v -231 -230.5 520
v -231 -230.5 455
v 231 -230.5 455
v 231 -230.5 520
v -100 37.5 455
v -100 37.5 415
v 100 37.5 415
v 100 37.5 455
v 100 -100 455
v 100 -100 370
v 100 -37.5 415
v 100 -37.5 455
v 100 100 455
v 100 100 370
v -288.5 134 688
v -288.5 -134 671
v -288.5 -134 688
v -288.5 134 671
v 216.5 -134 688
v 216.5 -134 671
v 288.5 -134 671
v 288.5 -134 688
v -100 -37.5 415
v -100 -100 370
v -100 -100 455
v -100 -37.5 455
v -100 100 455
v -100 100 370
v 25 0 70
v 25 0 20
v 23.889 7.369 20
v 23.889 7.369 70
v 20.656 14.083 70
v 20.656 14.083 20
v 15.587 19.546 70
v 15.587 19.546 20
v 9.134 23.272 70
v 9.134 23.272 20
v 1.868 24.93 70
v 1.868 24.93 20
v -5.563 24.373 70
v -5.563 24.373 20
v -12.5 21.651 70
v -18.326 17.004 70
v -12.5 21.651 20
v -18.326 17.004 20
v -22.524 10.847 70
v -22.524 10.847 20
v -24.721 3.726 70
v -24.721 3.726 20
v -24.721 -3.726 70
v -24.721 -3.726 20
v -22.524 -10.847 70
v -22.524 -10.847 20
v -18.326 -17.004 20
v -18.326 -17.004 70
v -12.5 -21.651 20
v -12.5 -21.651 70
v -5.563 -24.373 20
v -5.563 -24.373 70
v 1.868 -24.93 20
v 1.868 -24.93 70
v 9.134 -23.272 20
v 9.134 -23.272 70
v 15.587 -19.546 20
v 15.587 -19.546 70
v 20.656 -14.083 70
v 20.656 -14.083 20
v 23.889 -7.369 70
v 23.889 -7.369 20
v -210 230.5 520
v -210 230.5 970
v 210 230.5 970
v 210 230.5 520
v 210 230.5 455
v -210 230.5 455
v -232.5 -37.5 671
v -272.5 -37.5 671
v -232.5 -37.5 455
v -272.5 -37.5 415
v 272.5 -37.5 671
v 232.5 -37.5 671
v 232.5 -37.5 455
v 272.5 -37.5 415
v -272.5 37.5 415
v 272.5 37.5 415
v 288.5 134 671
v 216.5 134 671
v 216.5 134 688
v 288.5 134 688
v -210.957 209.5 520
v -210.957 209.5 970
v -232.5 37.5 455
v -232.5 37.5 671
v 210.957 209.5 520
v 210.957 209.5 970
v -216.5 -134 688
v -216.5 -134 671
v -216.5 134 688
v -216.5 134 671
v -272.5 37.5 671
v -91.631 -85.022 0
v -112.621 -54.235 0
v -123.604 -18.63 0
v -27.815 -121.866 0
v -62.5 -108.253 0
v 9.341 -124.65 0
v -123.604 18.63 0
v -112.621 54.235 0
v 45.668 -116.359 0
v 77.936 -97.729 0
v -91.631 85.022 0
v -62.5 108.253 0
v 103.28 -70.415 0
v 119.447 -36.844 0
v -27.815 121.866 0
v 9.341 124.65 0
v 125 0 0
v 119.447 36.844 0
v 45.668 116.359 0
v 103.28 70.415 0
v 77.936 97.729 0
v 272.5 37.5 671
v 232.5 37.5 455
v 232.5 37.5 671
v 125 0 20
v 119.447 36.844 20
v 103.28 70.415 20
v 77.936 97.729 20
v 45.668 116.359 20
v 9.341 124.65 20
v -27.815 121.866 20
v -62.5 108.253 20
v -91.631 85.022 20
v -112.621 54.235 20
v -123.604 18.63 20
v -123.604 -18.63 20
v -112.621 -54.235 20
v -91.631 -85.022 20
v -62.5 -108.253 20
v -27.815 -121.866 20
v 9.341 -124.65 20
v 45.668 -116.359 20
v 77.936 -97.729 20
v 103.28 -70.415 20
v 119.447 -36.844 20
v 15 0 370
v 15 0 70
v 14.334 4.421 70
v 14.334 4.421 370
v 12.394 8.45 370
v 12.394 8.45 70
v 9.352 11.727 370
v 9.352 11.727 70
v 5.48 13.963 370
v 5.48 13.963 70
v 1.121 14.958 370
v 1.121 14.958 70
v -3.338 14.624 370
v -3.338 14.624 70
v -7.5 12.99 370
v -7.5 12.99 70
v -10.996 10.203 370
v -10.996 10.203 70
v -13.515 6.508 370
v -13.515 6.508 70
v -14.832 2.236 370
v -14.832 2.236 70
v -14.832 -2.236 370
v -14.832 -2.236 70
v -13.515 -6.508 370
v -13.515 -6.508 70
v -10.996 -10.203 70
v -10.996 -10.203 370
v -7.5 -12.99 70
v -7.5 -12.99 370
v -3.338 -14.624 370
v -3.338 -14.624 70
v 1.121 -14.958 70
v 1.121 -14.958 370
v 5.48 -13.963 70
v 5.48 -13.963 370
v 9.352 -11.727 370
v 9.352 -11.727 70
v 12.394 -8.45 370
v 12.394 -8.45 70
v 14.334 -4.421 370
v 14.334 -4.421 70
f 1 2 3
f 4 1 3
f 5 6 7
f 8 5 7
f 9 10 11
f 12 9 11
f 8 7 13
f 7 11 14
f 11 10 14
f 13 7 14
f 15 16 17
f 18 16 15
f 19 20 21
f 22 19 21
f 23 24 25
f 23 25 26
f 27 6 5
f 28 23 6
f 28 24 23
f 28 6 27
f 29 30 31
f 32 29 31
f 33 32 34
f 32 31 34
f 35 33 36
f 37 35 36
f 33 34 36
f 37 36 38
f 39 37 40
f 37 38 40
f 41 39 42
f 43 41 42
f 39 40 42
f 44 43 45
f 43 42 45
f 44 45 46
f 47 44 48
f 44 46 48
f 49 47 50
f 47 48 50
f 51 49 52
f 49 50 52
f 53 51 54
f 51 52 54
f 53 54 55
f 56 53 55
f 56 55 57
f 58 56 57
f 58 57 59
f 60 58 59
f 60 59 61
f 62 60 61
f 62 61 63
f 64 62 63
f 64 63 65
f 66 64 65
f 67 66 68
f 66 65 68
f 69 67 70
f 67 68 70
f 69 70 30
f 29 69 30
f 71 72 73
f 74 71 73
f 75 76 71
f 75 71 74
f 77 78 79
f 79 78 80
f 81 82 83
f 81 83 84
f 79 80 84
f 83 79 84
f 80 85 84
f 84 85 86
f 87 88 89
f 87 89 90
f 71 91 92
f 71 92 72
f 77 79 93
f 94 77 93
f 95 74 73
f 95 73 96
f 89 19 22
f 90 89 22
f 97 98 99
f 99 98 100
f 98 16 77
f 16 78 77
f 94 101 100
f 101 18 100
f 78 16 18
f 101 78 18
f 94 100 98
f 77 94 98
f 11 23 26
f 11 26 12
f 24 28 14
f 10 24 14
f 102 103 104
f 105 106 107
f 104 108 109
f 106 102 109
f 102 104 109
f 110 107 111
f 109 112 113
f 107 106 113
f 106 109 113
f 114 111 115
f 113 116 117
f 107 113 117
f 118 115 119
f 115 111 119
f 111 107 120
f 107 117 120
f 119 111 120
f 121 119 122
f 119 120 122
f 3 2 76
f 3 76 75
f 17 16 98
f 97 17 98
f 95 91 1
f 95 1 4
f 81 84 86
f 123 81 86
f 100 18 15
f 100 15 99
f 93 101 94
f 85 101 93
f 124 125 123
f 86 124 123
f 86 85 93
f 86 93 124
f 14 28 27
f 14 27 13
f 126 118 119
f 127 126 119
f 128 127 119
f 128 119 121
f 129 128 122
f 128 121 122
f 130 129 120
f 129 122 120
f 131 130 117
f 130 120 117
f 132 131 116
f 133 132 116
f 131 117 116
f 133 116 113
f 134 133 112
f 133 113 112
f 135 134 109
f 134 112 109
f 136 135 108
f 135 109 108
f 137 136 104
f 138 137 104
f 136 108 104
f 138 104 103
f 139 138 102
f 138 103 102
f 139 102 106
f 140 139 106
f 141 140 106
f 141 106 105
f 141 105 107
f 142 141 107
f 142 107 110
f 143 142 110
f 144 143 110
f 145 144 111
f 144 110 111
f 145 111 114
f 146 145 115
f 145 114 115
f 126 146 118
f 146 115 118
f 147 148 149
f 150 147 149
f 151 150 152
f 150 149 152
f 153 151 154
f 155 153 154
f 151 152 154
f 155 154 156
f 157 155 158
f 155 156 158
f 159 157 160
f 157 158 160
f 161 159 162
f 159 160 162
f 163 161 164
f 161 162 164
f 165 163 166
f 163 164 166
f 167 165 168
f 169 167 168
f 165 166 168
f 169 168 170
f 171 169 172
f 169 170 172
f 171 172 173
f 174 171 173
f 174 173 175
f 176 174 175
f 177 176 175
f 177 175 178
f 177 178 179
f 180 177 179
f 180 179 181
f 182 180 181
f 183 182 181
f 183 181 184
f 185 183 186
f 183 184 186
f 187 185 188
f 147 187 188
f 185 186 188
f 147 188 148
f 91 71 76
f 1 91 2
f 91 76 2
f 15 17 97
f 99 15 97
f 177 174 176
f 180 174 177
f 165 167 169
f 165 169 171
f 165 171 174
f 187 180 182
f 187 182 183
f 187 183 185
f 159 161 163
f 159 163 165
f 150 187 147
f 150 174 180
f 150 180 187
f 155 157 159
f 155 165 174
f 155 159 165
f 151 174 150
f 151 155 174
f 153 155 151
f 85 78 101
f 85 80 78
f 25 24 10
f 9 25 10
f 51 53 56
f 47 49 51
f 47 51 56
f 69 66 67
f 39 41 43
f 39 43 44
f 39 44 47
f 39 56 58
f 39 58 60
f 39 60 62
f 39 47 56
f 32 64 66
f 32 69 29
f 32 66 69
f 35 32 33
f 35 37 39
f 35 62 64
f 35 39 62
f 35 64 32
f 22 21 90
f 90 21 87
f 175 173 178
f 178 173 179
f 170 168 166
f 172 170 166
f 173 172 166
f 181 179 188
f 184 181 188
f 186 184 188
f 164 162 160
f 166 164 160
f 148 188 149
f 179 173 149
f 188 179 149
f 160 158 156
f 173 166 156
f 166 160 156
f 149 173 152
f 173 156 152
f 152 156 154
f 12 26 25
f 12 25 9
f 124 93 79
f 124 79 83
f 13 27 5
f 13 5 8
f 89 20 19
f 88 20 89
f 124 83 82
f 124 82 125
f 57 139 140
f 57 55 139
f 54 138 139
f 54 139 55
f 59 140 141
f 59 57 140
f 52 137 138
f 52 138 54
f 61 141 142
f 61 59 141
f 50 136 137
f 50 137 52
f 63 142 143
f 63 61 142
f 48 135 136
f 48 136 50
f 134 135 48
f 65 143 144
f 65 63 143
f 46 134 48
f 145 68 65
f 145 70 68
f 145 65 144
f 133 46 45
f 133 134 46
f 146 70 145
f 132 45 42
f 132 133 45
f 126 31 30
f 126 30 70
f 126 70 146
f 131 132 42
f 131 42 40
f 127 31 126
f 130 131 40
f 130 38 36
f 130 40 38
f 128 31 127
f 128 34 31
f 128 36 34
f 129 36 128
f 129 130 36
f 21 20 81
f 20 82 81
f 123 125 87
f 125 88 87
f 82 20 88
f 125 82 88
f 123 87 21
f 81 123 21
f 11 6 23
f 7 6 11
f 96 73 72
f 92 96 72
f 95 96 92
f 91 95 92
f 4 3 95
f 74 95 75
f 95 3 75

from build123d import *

# Parameters (mm, degrees)
SKETCH_R     = 125
PAD_DEPTH    = 20
SKETCH001_R  = 25
PAD001_DEPTH = 50
SKETCH002_R  = 15
PAD002_DEPTH = 300
SKETCH003_W  = 200
SKETCH003_H  = 200
PAD003_DEPTH = 45
SKETCH009_W  = 200
SKETCH009_H  = 62.5
PAD009_DEPTH = 40
SKETCH004_W  = 545
SKETCH004_H  = 75
PAD004_DEPTH = 40
SKETCH005_W  = 40
SKETCH005_H  = 75
PAD005_DEPTH = 216
SKETCH006_W  = 72
SKETCH006_H  = 268
PAD006_DEPTH = 17
PAD007_DEPTH = 65
PAD008_DEPTH = 450


with BuildPart() as body1:
    # Sketch → Pad (new body)
    with BuildSketch(Plane.XY):
        Circle(SKETCH_R)
    extrude(amount=PAD_DEPTH)

    # Sketch001 (on Face3 of Pad) → Pad001 (join)
    with BuildSketch(Plane.XY.offset(20)):
        Circle(SKETCH001_R)
    extrude(amount=PAD001_DEPTH)


with BuildPart() as body2:
    # Sketch002 (on CopyPad) → Pad002 (new body)
    with BuildSketch(Plane.XY.offset(70)):
        Circle(SKETCH002_R)
    extrude(amount=PAD002_DEPTH)


with BuildPart() as body3:
    # Sketch003 (on Face1 of CopyPad002) → Pad003 (new body)
    with BuildSketch(Plane.XY.offset(370)):
        Rectangle(SKETCH003_W, SKETCH003_H)
    extrude(amount=PAD003_DEPTH)

    # Sketch009 (on Face6 of Pad003) → Pad009 (join)
    with BuildSketch(Plane.XY.offset(415)):
        with Locations((0, 68.75)):
            Rectangle(SKETCH009_W, SKETCH009_H)
        with Locations((0, -68.75)):
            Rectangle(SKETCH009_W, SKETCH009_H)
    extrude(amount=PAD009_DEPTH)


with BuildPart() as body4:
    # Sketch004 (on Face1 of CopyPad003) → Pad004 (new body)
    with BuildSketch(Plane.XY.offset(415)):
        Rectangle(SKETCH004_W, SKETCH004_H)
    extrude(amount=PAD004_DEPTH)

    # Sketch005 (on Face6 of Pad004) → Pad005 (join)
    with BuildSketch(Plane.XY.offset(455)):
        with Locations((-252.5, 0)):
            Rectangle(SKETCH005_W, SKETCH005_H)
        with Locations((252.5, 0)):
            Rectangle(SKETCH005_W, SKETCH005_H)
    extrude(amount=PAD005_DEPTH)

    # Sketch006 (on Face5 of Pad005) → Pad006 (join)
    with BuildSketch(Plane.XY.offset(671)):
        with Locations((-252.5, 0)):
            Rectangle(SKETCH006_W, SKETCH006_H)
        with Locations((252.5, 0)):
            Rectangle(SKETCH006_W, SKETCH006_H)
    extrude(amount=PAD006_DEPTH)


with BuildPart() as body5:
    # Sketch007 (on Face1 of CopyPad006) → Pad007 (new body)
    with BuildSketch(Plane.XY.offset(455)):
        Polygon((-210, 230.5), (-231, -230.5), (231, -230.5), (210, 230.5), align=None)
    extrude(amount=PAD007_DEPTH)

    # Sketch008 (on Face6 of Pad007) → Pad008 (join)
    with BuildSketch(Plane.XY.offset(520)):
        Polygon((-210, 230.5), (210, 230.5), (210.956616, 209.5), (-210.956616, 209.5), align=None)
    extrude(amount=PAD008_DEPTH)


solid = Compound([body1.part, body2.part, body3.part, body4.part, body5.part])
